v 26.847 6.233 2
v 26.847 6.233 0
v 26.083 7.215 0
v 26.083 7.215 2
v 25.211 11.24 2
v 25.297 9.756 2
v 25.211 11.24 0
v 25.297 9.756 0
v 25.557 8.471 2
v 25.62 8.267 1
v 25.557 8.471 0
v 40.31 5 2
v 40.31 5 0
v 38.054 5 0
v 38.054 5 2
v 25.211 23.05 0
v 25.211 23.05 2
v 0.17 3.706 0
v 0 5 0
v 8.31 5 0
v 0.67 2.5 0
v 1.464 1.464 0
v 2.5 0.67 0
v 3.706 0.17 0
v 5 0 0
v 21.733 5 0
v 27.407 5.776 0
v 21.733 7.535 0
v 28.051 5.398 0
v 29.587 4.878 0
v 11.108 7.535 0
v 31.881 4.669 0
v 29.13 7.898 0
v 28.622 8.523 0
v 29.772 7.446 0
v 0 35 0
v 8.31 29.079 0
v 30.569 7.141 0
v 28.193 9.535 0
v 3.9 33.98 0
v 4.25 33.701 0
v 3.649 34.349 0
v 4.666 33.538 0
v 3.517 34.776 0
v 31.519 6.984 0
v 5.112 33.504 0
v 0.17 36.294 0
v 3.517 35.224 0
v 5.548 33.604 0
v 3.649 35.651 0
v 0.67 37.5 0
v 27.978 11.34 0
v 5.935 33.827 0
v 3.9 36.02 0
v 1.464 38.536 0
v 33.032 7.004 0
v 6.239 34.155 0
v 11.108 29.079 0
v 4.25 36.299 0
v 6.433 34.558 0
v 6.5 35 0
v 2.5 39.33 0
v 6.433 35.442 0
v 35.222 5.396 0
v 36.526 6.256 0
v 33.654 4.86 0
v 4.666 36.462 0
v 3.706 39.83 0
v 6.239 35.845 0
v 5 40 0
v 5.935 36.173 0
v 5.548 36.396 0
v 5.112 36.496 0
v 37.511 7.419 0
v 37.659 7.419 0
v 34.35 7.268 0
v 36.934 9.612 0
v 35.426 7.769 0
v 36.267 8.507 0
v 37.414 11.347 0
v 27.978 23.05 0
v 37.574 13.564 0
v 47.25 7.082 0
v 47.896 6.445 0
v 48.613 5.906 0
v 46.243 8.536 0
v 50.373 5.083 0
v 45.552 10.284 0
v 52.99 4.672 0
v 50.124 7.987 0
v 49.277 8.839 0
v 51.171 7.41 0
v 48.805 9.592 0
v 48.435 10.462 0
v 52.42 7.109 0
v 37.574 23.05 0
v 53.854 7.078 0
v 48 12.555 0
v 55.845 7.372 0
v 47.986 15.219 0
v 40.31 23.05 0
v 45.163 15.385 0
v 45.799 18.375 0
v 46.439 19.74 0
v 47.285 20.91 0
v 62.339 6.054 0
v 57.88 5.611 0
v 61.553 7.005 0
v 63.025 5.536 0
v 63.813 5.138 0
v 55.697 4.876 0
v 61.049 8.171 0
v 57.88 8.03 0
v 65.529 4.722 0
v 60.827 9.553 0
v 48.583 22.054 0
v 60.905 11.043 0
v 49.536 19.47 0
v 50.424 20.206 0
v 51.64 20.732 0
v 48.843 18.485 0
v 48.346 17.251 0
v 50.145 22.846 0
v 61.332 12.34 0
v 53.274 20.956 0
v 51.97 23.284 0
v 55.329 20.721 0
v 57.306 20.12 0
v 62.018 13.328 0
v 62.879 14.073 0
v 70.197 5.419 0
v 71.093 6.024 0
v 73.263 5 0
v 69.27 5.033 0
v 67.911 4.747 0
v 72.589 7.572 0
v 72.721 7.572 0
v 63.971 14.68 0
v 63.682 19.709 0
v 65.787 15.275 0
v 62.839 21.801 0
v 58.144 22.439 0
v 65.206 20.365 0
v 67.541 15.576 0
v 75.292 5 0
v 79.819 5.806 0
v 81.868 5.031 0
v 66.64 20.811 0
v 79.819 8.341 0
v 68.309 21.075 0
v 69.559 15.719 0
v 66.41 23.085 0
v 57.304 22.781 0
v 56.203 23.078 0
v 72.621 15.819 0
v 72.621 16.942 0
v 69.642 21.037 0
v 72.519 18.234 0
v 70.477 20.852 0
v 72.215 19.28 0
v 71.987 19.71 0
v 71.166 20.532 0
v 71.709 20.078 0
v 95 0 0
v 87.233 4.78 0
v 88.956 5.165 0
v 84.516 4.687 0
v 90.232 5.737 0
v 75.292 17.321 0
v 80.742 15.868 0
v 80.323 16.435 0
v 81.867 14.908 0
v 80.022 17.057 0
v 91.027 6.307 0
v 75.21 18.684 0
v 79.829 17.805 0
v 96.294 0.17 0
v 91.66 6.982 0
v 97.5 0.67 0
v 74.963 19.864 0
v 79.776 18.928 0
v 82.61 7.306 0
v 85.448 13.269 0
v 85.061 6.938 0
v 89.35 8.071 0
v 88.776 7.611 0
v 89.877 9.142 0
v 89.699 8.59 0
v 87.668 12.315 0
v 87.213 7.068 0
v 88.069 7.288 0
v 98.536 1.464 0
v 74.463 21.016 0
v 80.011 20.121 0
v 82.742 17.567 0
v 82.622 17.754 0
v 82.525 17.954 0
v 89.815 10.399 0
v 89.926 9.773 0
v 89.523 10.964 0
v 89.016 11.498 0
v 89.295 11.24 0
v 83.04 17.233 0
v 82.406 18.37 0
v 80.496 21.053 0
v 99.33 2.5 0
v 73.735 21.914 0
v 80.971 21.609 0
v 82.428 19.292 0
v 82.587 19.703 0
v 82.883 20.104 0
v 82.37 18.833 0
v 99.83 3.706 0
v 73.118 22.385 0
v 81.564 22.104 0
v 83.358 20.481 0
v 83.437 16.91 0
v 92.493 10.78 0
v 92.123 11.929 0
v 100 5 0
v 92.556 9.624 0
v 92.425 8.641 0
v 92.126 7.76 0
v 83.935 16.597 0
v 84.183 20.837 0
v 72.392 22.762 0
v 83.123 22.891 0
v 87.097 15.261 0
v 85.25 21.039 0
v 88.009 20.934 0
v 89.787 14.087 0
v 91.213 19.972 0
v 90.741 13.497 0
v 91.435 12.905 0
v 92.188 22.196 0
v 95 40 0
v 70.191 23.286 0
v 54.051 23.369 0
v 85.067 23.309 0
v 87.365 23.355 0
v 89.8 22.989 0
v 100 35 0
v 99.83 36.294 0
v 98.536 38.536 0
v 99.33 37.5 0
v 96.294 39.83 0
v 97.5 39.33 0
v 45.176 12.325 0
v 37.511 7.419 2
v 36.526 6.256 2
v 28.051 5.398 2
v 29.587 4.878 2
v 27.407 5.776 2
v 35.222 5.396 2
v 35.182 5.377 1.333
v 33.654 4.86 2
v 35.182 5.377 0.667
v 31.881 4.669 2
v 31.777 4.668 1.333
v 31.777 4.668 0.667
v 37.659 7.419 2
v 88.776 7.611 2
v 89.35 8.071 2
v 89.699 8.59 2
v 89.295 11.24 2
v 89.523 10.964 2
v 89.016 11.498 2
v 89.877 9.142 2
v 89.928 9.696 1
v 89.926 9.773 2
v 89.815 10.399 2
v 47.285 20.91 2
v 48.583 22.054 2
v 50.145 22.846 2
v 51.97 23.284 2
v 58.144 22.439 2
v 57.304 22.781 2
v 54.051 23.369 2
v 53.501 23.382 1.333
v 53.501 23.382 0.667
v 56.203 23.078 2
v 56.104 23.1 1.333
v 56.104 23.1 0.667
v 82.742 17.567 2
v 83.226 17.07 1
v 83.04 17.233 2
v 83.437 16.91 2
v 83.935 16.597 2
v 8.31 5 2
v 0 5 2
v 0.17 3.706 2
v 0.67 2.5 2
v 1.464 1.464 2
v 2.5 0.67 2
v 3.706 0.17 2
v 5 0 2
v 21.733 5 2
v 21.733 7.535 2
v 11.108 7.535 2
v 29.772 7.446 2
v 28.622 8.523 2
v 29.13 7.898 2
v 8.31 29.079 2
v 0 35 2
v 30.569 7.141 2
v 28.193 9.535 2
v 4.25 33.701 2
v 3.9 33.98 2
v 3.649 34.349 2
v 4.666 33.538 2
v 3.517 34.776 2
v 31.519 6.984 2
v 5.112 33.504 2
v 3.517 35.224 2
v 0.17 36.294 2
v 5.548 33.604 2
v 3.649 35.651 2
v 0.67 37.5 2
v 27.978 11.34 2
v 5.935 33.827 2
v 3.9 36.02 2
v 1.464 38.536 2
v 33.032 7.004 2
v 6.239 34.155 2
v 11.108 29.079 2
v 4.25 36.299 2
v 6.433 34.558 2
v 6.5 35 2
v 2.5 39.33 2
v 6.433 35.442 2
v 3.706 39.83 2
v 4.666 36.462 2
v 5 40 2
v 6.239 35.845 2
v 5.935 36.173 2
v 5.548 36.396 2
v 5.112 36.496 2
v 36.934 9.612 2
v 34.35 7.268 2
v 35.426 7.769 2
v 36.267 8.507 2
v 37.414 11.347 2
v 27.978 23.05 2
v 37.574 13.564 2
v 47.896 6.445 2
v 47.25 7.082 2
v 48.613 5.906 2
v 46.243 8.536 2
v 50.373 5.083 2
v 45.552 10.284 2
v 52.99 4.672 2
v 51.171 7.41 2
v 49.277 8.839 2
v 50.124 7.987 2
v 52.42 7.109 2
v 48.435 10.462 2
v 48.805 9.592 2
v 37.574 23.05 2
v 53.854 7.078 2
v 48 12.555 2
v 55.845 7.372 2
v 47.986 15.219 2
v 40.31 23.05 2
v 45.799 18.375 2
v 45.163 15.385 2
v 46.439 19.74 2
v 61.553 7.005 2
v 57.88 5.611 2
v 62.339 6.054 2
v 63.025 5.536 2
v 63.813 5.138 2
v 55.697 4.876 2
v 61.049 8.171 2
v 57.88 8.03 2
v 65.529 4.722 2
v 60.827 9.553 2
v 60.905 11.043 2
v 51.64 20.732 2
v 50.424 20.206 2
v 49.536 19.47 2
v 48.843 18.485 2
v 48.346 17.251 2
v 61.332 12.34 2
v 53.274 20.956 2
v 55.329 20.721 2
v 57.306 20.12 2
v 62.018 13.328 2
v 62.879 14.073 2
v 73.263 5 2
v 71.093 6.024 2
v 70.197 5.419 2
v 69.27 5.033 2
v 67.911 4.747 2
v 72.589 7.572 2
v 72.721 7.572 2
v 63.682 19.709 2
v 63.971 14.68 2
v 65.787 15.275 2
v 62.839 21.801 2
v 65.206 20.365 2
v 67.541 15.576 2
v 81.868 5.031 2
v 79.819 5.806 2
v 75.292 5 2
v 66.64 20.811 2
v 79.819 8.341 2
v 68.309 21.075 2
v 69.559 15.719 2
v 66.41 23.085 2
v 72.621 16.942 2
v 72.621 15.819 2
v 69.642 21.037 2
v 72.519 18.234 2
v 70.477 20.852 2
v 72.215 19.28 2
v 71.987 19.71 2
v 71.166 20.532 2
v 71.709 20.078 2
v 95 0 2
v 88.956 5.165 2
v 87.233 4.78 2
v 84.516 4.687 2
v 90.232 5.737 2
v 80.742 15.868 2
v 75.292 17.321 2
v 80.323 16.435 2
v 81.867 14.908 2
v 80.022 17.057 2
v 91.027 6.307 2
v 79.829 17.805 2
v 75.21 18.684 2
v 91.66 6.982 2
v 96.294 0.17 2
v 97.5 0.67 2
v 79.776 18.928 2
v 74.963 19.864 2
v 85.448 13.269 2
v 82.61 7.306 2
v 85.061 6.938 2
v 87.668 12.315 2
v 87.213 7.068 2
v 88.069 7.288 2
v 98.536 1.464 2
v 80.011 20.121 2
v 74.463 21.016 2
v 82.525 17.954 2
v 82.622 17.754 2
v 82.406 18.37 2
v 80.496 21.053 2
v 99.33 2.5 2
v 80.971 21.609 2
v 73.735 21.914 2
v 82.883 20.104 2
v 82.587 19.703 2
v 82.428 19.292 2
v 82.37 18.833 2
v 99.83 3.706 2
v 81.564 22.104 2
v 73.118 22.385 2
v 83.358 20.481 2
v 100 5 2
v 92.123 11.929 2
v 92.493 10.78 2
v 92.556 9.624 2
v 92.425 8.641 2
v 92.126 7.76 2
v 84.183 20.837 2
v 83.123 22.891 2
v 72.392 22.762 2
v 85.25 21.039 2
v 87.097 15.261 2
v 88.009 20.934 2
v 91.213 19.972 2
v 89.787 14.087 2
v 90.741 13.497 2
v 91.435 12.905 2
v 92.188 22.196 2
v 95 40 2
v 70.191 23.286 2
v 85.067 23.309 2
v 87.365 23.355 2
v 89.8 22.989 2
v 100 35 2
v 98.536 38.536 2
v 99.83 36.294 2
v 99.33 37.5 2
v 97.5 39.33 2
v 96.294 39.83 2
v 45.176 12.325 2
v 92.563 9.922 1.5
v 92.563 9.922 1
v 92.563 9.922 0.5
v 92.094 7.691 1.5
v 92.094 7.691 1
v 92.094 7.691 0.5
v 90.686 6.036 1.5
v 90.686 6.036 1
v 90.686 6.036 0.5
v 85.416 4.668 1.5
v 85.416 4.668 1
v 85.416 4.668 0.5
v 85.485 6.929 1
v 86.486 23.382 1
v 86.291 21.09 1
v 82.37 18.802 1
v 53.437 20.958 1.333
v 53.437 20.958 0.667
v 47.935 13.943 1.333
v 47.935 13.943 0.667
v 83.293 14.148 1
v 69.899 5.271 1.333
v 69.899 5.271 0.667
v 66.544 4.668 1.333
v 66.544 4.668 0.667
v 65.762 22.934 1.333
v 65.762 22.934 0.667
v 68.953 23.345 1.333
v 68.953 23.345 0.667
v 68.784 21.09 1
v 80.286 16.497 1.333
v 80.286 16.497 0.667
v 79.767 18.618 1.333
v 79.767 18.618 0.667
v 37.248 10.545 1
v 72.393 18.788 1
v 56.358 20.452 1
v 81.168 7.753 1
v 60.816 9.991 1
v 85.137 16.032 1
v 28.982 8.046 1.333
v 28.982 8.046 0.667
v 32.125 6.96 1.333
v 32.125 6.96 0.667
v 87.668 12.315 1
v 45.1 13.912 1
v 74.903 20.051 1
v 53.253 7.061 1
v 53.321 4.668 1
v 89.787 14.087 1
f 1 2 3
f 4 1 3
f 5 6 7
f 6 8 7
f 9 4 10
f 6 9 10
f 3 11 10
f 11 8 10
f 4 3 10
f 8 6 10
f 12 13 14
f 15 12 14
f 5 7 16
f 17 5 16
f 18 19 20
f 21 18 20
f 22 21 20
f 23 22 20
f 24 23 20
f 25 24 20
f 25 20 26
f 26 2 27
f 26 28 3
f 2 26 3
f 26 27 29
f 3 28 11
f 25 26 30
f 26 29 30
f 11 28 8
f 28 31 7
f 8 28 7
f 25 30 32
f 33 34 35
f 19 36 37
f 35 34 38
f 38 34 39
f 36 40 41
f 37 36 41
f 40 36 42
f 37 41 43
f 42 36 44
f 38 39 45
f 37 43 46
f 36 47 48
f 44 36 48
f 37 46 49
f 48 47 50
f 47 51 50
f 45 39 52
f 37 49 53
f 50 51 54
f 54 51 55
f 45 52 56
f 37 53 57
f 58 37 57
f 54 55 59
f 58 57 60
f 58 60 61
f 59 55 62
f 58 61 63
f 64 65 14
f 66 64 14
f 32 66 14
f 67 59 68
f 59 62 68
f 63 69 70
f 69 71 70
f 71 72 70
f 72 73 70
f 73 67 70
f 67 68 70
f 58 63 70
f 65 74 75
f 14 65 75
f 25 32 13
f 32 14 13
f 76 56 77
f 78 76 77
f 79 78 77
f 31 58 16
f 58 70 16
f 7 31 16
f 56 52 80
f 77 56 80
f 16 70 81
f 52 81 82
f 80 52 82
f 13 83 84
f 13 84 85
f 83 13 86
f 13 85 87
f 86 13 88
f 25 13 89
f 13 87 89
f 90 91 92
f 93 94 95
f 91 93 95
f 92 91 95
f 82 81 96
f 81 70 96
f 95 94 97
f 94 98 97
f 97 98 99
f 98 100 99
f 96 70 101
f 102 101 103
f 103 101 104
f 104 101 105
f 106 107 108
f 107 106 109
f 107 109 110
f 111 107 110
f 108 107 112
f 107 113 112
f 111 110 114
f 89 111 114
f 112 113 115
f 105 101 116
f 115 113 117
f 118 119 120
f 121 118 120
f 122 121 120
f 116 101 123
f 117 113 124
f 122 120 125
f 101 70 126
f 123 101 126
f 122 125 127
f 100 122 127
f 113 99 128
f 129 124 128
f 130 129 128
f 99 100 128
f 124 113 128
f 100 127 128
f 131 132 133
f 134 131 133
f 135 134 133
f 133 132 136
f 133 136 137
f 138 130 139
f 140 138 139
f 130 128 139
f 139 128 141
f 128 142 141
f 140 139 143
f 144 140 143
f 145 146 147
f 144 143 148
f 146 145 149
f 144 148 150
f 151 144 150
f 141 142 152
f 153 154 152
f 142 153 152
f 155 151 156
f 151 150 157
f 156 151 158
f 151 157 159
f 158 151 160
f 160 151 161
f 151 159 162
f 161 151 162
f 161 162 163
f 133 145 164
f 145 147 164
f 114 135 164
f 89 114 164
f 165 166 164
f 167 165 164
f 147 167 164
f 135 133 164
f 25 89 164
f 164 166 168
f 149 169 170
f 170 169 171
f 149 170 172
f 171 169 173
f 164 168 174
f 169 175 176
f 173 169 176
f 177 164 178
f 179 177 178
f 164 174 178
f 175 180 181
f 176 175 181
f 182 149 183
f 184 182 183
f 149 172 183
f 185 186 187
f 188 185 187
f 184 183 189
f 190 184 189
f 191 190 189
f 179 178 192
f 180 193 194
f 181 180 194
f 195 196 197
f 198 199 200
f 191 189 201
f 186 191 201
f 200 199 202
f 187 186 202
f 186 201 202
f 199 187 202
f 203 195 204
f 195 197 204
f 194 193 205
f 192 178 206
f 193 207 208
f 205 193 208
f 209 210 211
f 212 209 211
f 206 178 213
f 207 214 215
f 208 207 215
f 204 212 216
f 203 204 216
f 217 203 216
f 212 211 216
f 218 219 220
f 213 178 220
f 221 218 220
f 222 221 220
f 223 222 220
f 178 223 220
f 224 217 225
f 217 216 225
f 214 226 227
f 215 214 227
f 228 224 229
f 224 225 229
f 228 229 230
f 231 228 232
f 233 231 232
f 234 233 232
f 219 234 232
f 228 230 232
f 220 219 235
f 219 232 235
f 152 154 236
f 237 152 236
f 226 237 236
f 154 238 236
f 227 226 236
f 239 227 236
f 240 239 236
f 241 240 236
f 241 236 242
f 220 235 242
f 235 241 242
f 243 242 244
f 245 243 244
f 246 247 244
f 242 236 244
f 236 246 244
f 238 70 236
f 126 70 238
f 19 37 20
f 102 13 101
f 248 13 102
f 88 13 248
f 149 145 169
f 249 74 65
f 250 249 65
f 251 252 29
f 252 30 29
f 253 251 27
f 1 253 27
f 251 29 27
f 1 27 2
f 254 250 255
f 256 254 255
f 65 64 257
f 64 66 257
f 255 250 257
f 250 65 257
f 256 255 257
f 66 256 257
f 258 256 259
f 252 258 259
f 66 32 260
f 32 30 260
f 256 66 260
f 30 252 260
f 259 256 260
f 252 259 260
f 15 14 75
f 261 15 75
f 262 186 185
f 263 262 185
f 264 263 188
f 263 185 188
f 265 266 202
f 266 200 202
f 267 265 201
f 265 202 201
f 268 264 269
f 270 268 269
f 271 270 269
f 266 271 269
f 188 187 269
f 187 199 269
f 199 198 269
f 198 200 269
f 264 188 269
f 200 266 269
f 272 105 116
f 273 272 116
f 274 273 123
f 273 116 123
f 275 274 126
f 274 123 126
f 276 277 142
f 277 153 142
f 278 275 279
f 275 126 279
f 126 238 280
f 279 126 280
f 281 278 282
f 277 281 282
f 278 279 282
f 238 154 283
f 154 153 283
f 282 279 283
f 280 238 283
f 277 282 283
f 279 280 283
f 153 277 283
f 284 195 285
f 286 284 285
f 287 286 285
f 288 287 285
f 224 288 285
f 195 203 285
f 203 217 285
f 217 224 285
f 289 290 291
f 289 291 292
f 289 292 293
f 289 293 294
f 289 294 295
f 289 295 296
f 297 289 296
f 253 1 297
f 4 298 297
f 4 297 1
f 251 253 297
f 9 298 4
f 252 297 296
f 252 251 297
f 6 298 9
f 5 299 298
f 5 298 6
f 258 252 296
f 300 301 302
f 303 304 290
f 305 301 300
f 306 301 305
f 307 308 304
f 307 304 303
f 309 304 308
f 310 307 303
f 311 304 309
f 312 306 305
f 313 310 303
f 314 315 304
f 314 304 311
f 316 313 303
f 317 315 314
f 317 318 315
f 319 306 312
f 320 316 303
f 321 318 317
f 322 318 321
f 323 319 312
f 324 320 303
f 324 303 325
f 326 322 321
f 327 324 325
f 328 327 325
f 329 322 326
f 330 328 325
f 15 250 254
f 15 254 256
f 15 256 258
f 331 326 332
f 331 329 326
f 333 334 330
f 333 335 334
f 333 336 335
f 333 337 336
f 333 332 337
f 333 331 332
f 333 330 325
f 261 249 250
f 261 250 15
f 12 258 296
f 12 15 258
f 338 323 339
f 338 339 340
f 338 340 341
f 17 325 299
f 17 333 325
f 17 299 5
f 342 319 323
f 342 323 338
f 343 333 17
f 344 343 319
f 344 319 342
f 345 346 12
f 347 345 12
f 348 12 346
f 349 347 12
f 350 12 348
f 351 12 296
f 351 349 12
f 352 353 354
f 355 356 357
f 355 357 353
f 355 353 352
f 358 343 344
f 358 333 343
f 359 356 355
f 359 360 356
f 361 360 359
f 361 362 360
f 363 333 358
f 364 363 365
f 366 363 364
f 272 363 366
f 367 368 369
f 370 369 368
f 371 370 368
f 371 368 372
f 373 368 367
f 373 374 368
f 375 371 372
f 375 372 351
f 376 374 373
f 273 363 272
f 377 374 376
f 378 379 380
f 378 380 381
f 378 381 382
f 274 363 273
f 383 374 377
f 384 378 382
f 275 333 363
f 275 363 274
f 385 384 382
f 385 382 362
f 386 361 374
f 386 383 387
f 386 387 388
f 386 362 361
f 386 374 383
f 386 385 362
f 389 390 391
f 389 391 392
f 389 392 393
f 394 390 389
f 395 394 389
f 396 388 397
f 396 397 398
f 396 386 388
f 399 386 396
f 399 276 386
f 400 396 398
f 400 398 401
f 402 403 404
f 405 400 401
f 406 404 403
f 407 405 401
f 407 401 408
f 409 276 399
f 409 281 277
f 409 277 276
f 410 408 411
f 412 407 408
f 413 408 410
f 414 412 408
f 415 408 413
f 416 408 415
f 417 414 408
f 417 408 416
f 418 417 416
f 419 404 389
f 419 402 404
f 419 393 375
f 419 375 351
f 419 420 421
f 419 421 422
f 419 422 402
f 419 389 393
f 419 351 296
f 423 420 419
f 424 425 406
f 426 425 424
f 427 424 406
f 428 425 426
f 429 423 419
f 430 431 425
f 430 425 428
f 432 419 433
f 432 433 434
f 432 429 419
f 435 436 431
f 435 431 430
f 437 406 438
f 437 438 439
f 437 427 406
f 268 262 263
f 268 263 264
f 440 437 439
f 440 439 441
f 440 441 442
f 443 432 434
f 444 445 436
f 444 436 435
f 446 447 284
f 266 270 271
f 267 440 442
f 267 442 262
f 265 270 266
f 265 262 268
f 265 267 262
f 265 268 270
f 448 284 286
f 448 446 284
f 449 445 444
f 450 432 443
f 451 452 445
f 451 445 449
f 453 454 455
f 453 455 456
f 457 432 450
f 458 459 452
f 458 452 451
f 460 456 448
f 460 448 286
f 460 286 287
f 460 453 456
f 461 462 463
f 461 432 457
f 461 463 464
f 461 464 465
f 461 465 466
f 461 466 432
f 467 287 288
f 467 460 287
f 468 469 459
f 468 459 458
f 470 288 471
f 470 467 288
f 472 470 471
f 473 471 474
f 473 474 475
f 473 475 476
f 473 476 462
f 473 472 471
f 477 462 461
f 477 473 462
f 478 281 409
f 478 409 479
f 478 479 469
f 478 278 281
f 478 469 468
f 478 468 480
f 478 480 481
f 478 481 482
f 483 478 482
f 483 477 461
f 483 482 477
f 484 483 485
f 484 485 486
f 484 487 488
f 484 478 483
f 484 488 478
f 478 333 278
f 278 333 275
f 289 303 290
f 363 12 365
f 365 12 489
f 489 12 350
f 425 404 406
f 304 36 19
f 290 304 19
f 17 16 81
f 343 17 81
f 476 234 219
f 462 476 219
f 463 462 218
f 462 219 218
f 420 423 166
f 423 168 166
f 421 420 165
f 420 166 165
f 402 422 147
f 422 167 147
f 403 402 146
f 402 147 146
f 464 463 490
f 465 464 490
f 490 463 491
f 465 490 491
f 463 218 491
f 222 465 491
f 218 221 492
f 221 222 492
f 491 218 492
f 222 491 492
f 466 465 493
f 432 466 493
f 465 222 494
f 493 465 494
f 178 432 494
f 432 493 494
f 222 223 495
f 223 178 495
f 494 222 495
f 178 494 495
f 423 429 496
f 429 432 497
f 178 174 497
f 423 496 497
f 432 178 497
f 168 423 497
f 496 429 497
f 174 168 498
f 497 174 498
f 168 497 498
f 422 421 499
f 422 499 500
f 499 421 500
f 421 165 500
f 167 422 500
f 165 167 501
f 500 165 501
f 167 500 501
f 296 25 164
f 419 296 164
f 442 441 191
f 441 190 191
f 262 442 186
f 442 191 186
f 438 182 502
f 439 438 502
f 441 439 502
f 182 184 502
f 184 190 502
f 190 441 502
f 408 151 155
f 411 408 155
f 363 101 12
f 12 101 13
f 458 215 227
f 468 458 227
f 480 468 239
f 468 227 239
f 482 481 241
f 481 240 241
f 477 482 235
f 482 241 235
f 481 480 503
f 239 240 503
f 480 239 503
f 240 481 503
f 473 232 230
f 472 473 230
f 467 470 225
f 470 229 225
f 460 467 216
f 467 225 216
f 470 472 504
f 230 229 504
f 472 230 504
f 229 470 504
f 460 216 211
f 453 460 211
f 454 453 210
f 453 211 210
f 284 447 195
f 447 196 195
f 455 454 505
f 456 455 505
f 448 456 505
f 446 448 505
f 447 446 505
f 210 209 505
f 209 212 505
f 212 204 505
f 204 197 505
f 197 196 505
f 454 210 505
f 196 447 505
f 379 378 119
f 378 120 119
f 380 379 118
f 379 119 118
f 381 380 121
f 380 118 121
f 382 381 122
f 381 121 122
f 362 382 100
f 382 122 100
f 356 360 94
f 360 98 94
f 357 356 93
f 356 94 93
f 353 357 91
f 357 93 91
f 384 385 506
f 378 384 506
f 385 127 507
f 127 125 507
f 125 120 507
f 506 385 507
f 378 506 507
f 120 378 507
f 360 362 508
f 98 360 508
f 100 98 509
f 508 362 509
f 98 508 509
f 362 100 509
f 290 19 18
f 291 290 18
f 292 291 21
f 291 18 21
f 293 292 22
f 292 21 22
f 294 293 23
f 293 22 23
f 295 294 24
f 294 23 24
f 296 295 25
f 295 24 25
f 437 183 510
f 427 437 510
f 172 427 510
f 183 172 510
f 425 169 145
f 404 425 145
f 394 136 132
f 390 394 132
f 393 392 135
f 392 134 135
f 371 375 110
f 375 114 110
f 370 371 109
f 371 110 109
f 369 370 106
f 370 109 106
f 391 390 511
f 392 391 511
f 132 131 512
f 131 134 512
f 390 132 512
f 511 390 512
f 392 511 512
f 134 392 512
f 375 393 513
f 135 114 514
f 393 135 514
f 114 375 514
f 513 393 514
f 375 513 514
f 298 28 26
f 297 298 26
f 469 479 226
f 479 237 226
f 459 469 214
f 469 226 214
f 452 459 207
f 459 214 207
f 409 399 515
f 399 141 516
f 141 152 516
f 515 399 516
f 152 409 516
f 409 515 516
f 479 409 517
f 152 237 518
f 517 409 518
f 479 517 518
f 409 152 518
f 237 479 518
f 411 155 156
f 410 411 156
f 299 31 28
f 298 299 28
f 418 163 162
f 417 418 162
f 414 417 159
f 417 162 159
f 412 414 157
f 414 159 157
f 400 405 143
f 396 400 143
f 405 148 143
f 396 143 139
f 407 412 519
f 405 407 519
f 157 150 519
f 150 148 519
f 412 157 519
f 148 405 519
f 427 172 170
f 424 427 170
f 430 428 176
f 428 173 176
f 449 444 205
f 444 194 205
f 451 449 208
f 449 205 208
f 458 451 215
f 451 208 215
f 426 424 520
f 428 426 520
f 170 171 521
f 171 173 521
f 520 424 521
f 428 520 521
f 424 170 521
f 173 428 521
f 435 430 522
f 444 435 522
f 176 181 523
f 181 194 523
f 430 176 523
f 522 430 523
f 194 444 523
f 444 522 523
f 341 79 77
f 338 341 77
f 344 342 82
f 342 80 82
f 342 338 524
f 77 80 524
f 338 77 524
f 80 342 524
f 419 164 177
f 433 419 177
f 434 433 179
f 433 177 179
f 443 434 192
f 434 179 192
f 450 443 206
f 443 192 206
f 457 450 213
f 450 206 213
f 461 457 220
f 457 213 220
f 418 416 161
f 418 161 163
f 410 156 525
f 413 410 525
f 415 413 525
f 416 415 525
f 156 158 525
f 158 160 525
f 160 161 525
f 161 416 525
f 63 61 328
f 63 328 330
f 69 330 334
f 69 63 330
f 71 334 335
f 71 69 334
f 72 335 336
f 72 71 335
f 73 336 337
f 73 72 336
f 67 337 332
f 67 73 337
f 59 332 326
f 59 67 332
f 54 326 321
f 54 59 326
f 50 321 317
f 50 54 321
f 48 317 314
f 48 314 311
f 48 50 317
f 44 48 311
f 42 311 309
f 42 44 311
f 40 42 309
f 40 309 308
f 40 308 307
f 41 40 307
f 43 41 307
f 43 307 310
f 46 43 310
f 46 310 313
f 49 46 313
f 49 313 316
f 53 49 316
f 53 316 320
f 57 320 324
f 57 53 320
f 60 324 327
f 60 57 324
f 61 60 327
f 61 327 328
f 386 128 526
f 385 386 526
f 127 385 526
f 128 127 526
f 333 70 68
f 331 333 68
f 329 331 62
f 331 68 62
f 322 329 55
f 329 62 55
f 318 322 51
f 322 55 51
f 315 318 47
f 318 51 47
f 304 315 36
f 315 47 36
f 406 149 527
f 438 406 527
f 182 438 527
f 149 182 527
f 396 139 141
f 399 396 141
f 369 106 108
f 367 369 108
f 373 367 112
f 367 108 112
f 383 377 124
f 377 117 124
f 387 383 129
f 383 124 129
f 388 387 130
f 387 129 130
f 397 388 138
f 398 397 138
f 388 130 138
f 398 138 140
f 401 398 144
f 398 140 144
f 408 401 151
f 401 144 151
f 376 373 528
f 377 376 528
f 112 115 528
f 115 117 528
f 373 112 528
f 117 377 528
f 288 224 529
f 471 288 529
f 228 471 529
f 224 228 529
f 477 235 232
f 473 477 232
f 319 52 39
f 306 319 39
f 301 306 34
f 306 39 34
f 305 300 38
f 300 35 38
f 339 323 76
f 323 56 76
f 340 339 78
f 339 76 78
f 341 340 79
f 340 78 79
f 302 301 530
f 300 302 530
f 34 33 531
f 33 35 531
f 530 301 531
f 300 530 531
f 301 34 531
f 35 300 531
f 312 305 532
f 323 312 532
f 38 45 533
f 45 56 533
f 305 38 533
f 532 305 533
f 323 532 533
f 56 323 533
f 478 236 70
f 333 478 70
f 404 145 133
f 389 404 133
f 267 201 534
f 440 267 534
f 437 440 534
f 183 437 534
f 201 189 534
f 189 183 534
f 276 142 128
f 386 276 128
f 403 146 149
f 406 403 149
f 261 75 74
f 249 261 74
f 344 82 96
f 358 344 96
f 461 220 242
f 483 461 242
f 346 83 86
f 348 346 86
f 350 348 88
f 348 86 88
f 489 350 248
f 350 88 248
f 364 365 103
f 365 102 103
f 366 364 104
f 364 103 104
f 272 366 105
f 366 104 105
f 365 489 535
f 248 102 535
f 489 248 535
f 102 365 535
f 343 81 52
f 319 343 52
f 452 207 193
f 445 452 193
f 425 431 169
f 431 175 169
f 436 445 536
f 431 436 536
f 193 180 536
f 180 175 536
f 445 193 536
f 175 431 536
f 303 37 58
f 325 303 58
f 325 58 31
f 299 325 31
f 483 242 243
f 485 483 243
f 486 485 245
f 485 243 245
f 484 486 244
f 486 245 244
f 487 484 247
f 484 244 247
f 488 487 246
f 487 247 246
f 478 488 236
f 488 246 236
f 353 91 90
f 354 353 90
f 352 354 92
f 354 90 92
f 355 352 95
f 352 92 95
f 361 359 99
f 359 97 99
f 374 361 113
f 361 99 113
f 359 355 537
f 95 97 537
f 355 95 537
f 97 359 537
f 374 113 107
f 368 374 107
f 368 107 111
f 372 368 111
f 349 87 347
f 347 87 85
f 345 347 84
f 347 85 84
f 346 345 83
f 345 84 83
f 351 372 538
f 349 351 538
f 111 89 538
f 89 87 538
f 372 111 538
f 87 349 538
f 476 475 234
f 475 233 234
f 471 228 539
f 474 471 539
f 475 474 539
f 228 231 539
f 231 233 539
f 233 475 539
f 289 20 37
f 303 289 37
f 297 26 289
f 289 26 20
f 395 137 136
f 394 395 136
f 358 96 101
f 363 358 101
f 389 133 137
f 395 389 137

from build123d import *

# Parameters (mm, degrees)
F0_R     = 1.5
F1_DEPTH = 2


with BuildPart() as f1:
    # F0 (on Top) → F1 (new body)
    with BuildSketch(Plane.XY):
        with BuildLine():
            ThreePointArc((0, 5), (1.4644660941, 1.4644660941), (5, 0))
            Line((5, 0), (95, 0))
            ThreePointArc((95, 0), (98.5355339059, 1.4644660941), (100, 5))
            Line((100, 5), (100, 35))
            ThreePointArc((100, 35), (98.5355339059, 38.5355339059), (95, 40))
            Line((95, 40), (5, 40))
            ThreePointArc((5, 40), (1.4644660941, 38.5355339059), (0, 35))
            Line((0, 35), (0, 5))
        make_face()
        Polygon((21.7325409239, 5), (8.3096175434, 5), (8.3096175434, 29.0790486555), (11.1080361987, 29.0790486555), (11.1080361987, 7.5349140738), (21.7325409239, 7.5349140738), align=None, mode=Mode.SUBTRACT)
        with BuildLine():
            Line((25.2108013994, 23.0500638312), (27.9775995049, 23.0500638312))
            Line((27.9775995049, 23.0500638312), (27.9775995049, 11.3399202304))
            add(Edge.make_bspline(
                [(27.9775995049, 11.3399202304), (27.9775995049, 9.1317518376), (28.9815519603, 8.0461129619)],
                knots=[0, 0, 0, 1, 1, 1], degree=2))
            add(Edge.make_bspline(
                [(28.9815519603, 8.0461129619), (29.9855044157, 6.9604740862), (32.1251616173, 6.9604740862)],
                knots=[0, 0, 0, 1, 1, 1], degree=2))
            add(Edge.make_bspline(
                [(32.1251616173, 6.9604740862), (34.960470914, 6.9604740862), (36.2674536382, 8.5072459795)],
                knots=[0, 0, 0, 1, 1, 1], degree=2))
            add(Edge.make_bspline(
                [(36.2674536382, 8.5072459795), (37.5744363623, 10.0540178727), (37.5744363623, 13.563898898)],
                knots=[0, 0, 0, 1, 1, 1], degree=2))
            Line((37.5744363623, 13.563898898), (37.5744363623, 23.0500638312))
            Line((37.5744363623, 23.0500638312), (40.3096139181, 23.0500638312))
            Line((40.3096139181, 23.0500638312), (40.3096139181, 5))
            Line((40.3096139181, 5), (38.0540147006, 5))
            Line((38.0540147006, 5), (37.6587578284, 7.418972058))
            Line((37.6587578284, 7.418972058), (37.5111952628, 7.418972058))
            add(Edge.make_bspline(
                [(37.5111952628, 7.418972058), (36.6732506937, 6.0856388757), (35.1818147625, 5.3768115515)],
                knots=[0, 0, 0, 1, 1, 1], degree=2))
            add(Edge.make_bspline(
                [(35.1818147625, 5.3768115515), (33.6903788313, 4.6679842273), (31.7773355698, 4.6679842273)],
                knots=[0, 0, 0, 1, 1, 1], degree=2))
            add(Edge.make_bspline(
                [(31.7773355698, 4.6679842273), (28.4835283013, 4.6679842273), (26.8471648503, 6.2332014413)],
                knots=[0, 0, 0, 1, 1, 1], degree=2))
            add(Edge.make_bspline(
                [(26.8471648503, 6.2332014413), (25.2108013994, 7.7984186553), (25.2108013994, 11.2397884894)],
                knots=[0, 0, 0, 1, 1, 1], degree=2))
            Line((25.2108013994, 11.2397884894), (25.2108013994, 23.0500638312))
        make_face(mode=Mode.SUBTRACT)
        with BuildLine():
            add(Edge.make_bspline(
                [(57.880099411, 5.611330629), (56.0724579821, 4.6679842273), (53.3214701514, 4.6679842273)],
                knots=[0, 0, 0, 1, 1, 1], degree=2))
            add(Edge.make_bspline(
                [(53.3214701514, 4.6679842273), (49.400521979, 4.6679842273), (47.2503245942, 7.0816861937)],
                knots=[0, 0, 0, 1, 1, 1], degree=2))
            add(Edge.make_bspline(
                [(47.2503245942, 7.0816861937), (45.1001272093, 9.49538816), (45.1001272093, 13.9117249456)],
                knots=[0, 0, 0, 1, 1, 1], degree=2))
            add(Edge.make_bspline(
                [(45.1001272093, 13.9117249456), (45.1001272093, 18.4387336554), (47.2845801898, 20.9104066296)],
                knots=[0, 0, 0, 1, 1, 1], degree=2))
            add(Edge.make_bspline(
                [(47.2845801898, 20.9104066296), (49.4690331702, 23.3820796039), (53.5006532668, 23.3820796039)],
                knots=[0, 0, 0, 1, 1, 1], degree=2))
            add(Edge.make_bspline(
                [(53.5006532668, 23.3820796039), (54.8023658993, 23.3820796039), (56.1040785318, 23.1001297017)],
                knots=[0, 0, 0, 1, 1, 1], degree=2))
            add(Edge.make_bspline(
                [(56.1040785318, 23.1001297017), (57.4057911643, 22.8181797995), (58.1436039925, 22.4387332022)],
                knots=[0, 0, 0, 1, 1, 1], degree=2))
            Line((58.1436039925, 22.4387332022), (57.3056594234, 20.1198928852))
            add(Edge.make_bspline(
                [(57.3056594234, 20.1198928852), (56.3992036631, 20.4835292076), (55.3293750623, 20.720683331)],
                knots=[0, 0, 0, 1, 1, 1], degree=2))
            add(Edge.make_bspline(
                [(55.3293750623, 20.720683331), (54.2595464615, 20.9578374543), (53.4374121673, 20.9578374543)],
                knots=[0, 0, 0, 1, 1, 1], degree=2))
            add(Edge.make_bspline(
                [(53.4374121673, 20.9578374543), (47.935436506, 20.9578374543), (47.935436506, 13.9433454954)],
                knots=[0, 0, 0, 1, 1, 1], degree=2))
            add(Edge.make_bspline(
                [(47.935436506, 13.9433454954), (47.935436506, 10.6179176771), (49.2766748257, 8.8392617521)],
                knots=[0, 0, 0, 1, 1, 1], degree=2))
            add(Edge.make_bspline(
                [(49.2766748257, 8.8392617521), (50.6179131455, 7.0606058272), (53.2529589602, 7.0606058272)],
                knots=[0, 0, 0, 1, 1, 1], degree=2))
            add(Edge.make_bspline(
                [(53.2529589602, 7.0606058272), (55.5085581777, 7.0606058272), (57.880099411, 8.030302687)],
                knots=[0, 0, 0, 1, 1, 1], degree=2))
            Line((57.880099411, 8.030302687), (57.880099411, 5.611330629))
        make_face(mode=Mode.SUBTRACT)
        with BuildLine():
            Line((75.2924821551, 5), (73.2634968777, 5))
            Line((73.2634968777, 5), (72.7206774398, 7.5718047152))
            Line((72.7206774398, 7.5718047152), (72.5889251491, 7.5718047152))
            add(Edge.make_bspline(
                [(72.5889251491, 7.5718047152), (71.2397816919, 5.8748352105), (69.8985433722, 5.2714097189)],
                knots=[0, 0, 0, 1, 1, 1], degree=2))
            add(Edge.make_bspline(
                [(69.8985433722, 5.2714097189), (68.5573050525, 4.6679842273), (66.54413005, 4.6679842273)],
                knots=[0, 0, 0, 1, 1, 1], degree=2))
            add(Edge.make_bspline(
                [(66.54413005, 4.6679842273), (63.8616534106, 4.6679842273), (62.3385969296, 6.0540183259)],
                knots=[0, 0, 0, 1, 1, 1], degree=2))
            add(Edge.make_bspline(
                [(62.3385969296, 6.0540183259), (60.8155404487, 7.4400524245), (60.8155404487, 9.9907767732)],
                knots=[0, 0, 0, 1, 1, 1], degree=2))
            add(Edge.make_bspline(
                [(60.8155404487, 9.9907767732), (60.8155404487, 15.455861793), (69.5586224621, 15.7193663745)],
                knots=[0, 0, 0, 1, 1, 1], degree=2))
            Line((69.5586224621, 15.7193663745), (72.6205456989, 15.8194981155))
            Line((72.6205456989, 15.8194981155), (72.6205456989, 16.9420276326))
            add(Edge.make_bspline(
                [(72.6205456989, 16.9420276326), (72.6205456989, 19.0658745593), (71.708819847, 20.0777321522)],
                knots=[0, 0, 0, 1, 1, 1], degree=2))
            add(Edge.make_bspline(
                [(71.708819847, 20.0777321522), (70.7970939951, 21.089589745), (68.7839189926, 21.089589745)],
                knots=[0, 0, 0, 1, 1, 1], degree=2))
            add(Edge.make_bspline(
                [(68.7839189926, 21.089589745), (66.5283197751, 21.089589745), (63.6824702951, 19.7088257381)],
                knots=[0, 0, 0, 1, 1, 1], degree=2))
            Line((63.6824702951, 19.7088257381), (62.8392556344, 21.801052115))
            add(Edge.make_bspline(
                [(62.8392556344, 21.801052115), (64.1725888167, 22.5230546683), (65.761521443, 22.9341218154)],
                knots=[0, 0, 0, 1, 1, 1], degree=2))
            add(Edge.make_bspline(
                [(65.761521443, 22.9341218154), (67.3504540693, 23.3451889625), (68.9525619247, 23.3451889625)],
                knots=[0, 0, 0, 1, 1, 1], degree=2))
            add(Edge.make_bspline(
                [(68.9525619247, 23.3451889625), (72.177858002, 23.3451889625), (73.7351700785, 21.9143590851)],
                knots=[0, 0, 0, 1, 1, 1], degree=2))
            add(Edge.make_bspline(
                [(73.7351700785, 21.9143590851), (75.2924821551, 20.4835292076), (75.2924821551, 17.3214742299)],
                knots=[0, 0, 0, 1, 1, 1], degree=2))
            Line((75.2924821551, 17.3214742299), (75.2924821551, 5))
        make_face(mode=Mode.SUBTRACT)
        with BuildLine():
            add(Edge.make_bspline(
                [(91.4347728164, 12.9051374443), (92.5625724251, 11.7193668277), (92.5625724251, 9.922265582)],
                knots=[0, 0, 0, 1, 1, 1], degree=2))
            add(Edge.make_bspline(
                [(92.5625724251, 9.922265582), (92.5625724251, 7.4031617831), (90.686419805, 6.0355730052)],
                knots=[0, 0, 0, 1, 1, 1], degree=2))
            add(Edge.make_bspline(
                [(90.686419805, 6.0355730052), (88.8102671849, 4.6679842273), (85.4163281755, 4.6679842273)],
                knots=[0, 0, 0, 1, 1, 1], degree=2))
            add(Edge.make_bspline(
                [(85.4163281755, 4.6679842273), (81.8273957757, 4.6679842273), (79.8194908649, 5.8063240193)],
                knots=[0, 0, 0, 1, 1, 1], degree=2))
            Line((79.8194908649, 5.8063240193), (79.8194908649, 8.3412380931))
            add(Edge.make_bspline(
                [(79.8194908649, 8.3412380931), (81.1212034974, 7.6824766394), (82.6100043827, 7.3056650879)],
                knots=[0, 0, 0, 1, 1, 1], degree=2))
            add(Edge.make_bspline(
                [(82.6100043827, 7.3056650879), (84.0988052681, 6.9288535364), (85.4848393666, 6.9288535364)],
                knots=[0, 0, 0, 1, 1, 1], degree=2))
            add(Edge.make_bspline(
                [(85.4848393666, 6.9288535364), (87.6244965682, 6.9288535364), (88.7760115893, 7.6113304024)],
                knots=[0, 0, 0, 1, 1, 1], degree=2))
            add(Edge.make_bspline(
                [(88.7760115893, 7.6113304024), (89.9275266104, 8.2938072685), (89.9275266104, 9.6956516419)],
                knots=[0, 0, 0, 1, 1, 1], degree=2))
            add(Edge.make_bspline(
                [(89.9275266104, 9.6956516419), (89.9275266104, 10.7496699678), (89.0158007584, 11.4980229792)],
                knots=[0, 0, 0, 1, 1, 1], degree=2))
            add(Edge.make_bspline(
                [(89.0158007584, 11.4980229792), (88.1040749065, 12.2463759906), (85.4479487252, 13.2687737668)],
                knots=[0, 0, 0, 1, 1, 1], degree=2))
            add(Edge.make_bspline(
                [(85.4479487252, 13.2687737668), (82.9288449263, 14.2068500768), (81.8669214629, 14.9077722636)],
                knots=[0, 0, 0, 1, 1, 1], degree=2))
            add(Edge.make_bspline(
                [(81.8669214629, 14.9077722636), (80.8049979996, 15.6086944503), (80.2858939741, 16.4967048899)],
                knots=[0, 0, 0, 1, 1, 1], degree=2))
            add(Edge.make_bspline(
                [(80.2858939741, 16.4967048899), (79.7667899486, 17.3847153295), (79.7667899486, 18.6179167708)],
                knots=[0, 0, 0, 1, 1, 1], degree=2))
            add(Edge.make_bspline(
                [(79.7667899486, 18.6179167708), (79.7667899486, 20.8260851636), (81.5638911942, 22.1040823837)],
                knots=[0, 0, 0, 1, 1, 1], degree=2))
            add(Edge.make_bspline(
                [(81.5638911942, 22.1040823837), (83.3609924399, 23.3820796039), (86.4861567763, 23.3820796039)],
                knots=[0, 0, 0, 1, 1, 1], degree=2))
            add(Edge.make_bspline(
                [(86.4861567763, 23.3820796039), (89.4005174474, 23.3820796039), (92.1883959194, 22.1963089873)],
                knots=[0, 0, 0, 1, 1, 1], degree=2))
            Line((92.1883959194, 22.1963089873), (91.213428968, 19.9723303196))
            add(Edge.make_bspline(
                [(91.213428968, 19.9723303196), (88.4993317787, 21.089589745), (86.291163386, 21.089589745)],
                knots=[0, 0, 0, 1, 1, 1], degree=2))
            add(Edge.make_bspline(
                [(86.291163386, 21.089589745), (84.3464995747, 21.089589745), (83.3583573941, 20.4808941618)],
                knots=[0, 0, 0, 1, 1, 1], degree=2))
            add(Edge.make_bspline(
                [(83.3583573941, 20.4808941618), (82.3702152136, 19.8721985786), (82.3702152136, 18.8023699778)],
                knots=[0, 0, 0, 1, 1, 1], degree=2))
            add(Edge.make_bspline(
                [(82.3702152136, 18.8023699778), (82.3702152136, 18.0750973329), (82.7417566735, 17.5665334907)],
                knots=[0, 0, 0, 1, 1, 1], degree=2))
            add(Edge.make_bspline(
                [(82.7417566735, 17.5665334907), (83.1132981333, 17.0579696484), (83.9354324275, 16.5968366308)],
                knots=[0, 0, 0, 1, 1, 1], degree=2))
            add(Edge.make_bspline(
                [(83.9354324275, 16.5968366308), (84.7575667218, 16.1357036133), (87.0974874053, 15.2608684028)],
                knots=[0, 0, 0, 1, 1, 1], degree=2))
            add(Edge.make_bspline(
                [(87.0974874053, 15.2608684028), (90.3069732077, 14.090908061), (91.4347728164, 12.9051374443)],
                knots=[0, 0, 0, 1, 1, 1], degree=2))
        make_face(mode=Mode.SUBTRACT)
        with Locations((5, 35)):
            Circle(F0_R, mode=Mode.SUBTRACT)
    extrude(amount=F1_DEPTH)


solid = f1.part
